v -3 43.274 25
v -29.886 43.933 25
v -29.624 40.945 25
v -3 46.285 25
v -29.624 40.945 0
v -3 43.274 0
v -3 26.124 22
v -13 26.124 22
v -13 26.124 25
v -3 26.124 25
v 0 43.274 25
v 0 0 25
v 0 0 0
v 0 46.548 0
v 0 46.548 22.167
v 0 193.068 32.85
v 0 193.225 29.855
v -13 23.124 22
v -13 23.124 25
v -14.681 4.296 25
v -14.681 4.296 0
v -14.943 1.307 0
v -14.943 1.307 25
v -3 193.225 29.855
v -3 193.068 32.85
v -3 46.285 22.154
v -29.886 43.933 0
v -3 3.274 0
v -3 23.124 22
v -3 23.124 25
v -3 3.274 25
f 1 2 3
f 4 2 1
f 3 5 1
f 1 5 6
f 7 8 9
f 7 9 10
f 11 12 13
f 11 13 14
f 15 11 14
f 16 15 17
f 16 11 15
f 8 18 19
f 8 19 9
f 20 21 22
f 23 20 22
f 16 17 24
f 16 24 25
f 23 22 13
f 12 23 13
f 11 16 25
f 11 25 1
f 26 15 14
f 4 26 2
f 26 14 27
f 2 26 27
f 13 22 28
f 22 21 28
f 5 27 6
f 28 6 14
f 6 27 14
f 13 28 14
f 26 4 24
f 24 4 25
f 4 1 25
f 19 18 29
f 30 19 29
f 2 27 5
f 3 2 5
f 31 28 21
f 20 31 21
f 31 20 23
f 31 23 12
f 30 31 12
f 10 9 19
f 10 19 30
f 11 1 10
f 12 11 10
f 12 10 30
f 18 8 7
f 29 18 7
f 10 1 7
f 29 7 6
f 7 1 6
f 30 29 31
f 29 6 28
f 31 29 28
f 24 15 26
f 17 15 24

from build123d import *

# Parameters (mm, degrees)
F1_DEPTH = 25
F3_START = 22
F2_W     = 10
F2_H     = 3
F3_DEPTH = 3
F5_DEPTH = 3


with BuildPart() as f1:
    # F0 (on Top) → F1 (new body)
    with BuildSketch(Plane.XY):
        Polygon((-14.9429204714, 1.3073361412), (0, 0), (0, 46.5478510064), (-29.8858409428, 43.933178724), (-29.6243737145, 40.9445946297), (-3, 43.2739255032), (-3, 3.2739255032), (-14.6814532431, 4.2959202355), align=None)
    extrude(amount=F1_DEPTH)

    # F2 (on Top) → F3 (join)
    with BuildSketch(Plane.XY.offset(F3_START)):
        with Locations((-8, 24.6239255032)):
            Rectangle(F2_W, F2_H)
    extrude(amount=F3_DEPTH)

    # F4 (on Right) → F5 (join)
    with BuildSketch(Plane.YZ):
        Polygon((193.0683557164, 32.8503934364), (43.2739255032, 25), (43.4309333719, 22.0041113957), (193.2253635851, 29.8545048322), align=None)
    extrude(amount=-F5_DEPTH)


solid = f1.part
